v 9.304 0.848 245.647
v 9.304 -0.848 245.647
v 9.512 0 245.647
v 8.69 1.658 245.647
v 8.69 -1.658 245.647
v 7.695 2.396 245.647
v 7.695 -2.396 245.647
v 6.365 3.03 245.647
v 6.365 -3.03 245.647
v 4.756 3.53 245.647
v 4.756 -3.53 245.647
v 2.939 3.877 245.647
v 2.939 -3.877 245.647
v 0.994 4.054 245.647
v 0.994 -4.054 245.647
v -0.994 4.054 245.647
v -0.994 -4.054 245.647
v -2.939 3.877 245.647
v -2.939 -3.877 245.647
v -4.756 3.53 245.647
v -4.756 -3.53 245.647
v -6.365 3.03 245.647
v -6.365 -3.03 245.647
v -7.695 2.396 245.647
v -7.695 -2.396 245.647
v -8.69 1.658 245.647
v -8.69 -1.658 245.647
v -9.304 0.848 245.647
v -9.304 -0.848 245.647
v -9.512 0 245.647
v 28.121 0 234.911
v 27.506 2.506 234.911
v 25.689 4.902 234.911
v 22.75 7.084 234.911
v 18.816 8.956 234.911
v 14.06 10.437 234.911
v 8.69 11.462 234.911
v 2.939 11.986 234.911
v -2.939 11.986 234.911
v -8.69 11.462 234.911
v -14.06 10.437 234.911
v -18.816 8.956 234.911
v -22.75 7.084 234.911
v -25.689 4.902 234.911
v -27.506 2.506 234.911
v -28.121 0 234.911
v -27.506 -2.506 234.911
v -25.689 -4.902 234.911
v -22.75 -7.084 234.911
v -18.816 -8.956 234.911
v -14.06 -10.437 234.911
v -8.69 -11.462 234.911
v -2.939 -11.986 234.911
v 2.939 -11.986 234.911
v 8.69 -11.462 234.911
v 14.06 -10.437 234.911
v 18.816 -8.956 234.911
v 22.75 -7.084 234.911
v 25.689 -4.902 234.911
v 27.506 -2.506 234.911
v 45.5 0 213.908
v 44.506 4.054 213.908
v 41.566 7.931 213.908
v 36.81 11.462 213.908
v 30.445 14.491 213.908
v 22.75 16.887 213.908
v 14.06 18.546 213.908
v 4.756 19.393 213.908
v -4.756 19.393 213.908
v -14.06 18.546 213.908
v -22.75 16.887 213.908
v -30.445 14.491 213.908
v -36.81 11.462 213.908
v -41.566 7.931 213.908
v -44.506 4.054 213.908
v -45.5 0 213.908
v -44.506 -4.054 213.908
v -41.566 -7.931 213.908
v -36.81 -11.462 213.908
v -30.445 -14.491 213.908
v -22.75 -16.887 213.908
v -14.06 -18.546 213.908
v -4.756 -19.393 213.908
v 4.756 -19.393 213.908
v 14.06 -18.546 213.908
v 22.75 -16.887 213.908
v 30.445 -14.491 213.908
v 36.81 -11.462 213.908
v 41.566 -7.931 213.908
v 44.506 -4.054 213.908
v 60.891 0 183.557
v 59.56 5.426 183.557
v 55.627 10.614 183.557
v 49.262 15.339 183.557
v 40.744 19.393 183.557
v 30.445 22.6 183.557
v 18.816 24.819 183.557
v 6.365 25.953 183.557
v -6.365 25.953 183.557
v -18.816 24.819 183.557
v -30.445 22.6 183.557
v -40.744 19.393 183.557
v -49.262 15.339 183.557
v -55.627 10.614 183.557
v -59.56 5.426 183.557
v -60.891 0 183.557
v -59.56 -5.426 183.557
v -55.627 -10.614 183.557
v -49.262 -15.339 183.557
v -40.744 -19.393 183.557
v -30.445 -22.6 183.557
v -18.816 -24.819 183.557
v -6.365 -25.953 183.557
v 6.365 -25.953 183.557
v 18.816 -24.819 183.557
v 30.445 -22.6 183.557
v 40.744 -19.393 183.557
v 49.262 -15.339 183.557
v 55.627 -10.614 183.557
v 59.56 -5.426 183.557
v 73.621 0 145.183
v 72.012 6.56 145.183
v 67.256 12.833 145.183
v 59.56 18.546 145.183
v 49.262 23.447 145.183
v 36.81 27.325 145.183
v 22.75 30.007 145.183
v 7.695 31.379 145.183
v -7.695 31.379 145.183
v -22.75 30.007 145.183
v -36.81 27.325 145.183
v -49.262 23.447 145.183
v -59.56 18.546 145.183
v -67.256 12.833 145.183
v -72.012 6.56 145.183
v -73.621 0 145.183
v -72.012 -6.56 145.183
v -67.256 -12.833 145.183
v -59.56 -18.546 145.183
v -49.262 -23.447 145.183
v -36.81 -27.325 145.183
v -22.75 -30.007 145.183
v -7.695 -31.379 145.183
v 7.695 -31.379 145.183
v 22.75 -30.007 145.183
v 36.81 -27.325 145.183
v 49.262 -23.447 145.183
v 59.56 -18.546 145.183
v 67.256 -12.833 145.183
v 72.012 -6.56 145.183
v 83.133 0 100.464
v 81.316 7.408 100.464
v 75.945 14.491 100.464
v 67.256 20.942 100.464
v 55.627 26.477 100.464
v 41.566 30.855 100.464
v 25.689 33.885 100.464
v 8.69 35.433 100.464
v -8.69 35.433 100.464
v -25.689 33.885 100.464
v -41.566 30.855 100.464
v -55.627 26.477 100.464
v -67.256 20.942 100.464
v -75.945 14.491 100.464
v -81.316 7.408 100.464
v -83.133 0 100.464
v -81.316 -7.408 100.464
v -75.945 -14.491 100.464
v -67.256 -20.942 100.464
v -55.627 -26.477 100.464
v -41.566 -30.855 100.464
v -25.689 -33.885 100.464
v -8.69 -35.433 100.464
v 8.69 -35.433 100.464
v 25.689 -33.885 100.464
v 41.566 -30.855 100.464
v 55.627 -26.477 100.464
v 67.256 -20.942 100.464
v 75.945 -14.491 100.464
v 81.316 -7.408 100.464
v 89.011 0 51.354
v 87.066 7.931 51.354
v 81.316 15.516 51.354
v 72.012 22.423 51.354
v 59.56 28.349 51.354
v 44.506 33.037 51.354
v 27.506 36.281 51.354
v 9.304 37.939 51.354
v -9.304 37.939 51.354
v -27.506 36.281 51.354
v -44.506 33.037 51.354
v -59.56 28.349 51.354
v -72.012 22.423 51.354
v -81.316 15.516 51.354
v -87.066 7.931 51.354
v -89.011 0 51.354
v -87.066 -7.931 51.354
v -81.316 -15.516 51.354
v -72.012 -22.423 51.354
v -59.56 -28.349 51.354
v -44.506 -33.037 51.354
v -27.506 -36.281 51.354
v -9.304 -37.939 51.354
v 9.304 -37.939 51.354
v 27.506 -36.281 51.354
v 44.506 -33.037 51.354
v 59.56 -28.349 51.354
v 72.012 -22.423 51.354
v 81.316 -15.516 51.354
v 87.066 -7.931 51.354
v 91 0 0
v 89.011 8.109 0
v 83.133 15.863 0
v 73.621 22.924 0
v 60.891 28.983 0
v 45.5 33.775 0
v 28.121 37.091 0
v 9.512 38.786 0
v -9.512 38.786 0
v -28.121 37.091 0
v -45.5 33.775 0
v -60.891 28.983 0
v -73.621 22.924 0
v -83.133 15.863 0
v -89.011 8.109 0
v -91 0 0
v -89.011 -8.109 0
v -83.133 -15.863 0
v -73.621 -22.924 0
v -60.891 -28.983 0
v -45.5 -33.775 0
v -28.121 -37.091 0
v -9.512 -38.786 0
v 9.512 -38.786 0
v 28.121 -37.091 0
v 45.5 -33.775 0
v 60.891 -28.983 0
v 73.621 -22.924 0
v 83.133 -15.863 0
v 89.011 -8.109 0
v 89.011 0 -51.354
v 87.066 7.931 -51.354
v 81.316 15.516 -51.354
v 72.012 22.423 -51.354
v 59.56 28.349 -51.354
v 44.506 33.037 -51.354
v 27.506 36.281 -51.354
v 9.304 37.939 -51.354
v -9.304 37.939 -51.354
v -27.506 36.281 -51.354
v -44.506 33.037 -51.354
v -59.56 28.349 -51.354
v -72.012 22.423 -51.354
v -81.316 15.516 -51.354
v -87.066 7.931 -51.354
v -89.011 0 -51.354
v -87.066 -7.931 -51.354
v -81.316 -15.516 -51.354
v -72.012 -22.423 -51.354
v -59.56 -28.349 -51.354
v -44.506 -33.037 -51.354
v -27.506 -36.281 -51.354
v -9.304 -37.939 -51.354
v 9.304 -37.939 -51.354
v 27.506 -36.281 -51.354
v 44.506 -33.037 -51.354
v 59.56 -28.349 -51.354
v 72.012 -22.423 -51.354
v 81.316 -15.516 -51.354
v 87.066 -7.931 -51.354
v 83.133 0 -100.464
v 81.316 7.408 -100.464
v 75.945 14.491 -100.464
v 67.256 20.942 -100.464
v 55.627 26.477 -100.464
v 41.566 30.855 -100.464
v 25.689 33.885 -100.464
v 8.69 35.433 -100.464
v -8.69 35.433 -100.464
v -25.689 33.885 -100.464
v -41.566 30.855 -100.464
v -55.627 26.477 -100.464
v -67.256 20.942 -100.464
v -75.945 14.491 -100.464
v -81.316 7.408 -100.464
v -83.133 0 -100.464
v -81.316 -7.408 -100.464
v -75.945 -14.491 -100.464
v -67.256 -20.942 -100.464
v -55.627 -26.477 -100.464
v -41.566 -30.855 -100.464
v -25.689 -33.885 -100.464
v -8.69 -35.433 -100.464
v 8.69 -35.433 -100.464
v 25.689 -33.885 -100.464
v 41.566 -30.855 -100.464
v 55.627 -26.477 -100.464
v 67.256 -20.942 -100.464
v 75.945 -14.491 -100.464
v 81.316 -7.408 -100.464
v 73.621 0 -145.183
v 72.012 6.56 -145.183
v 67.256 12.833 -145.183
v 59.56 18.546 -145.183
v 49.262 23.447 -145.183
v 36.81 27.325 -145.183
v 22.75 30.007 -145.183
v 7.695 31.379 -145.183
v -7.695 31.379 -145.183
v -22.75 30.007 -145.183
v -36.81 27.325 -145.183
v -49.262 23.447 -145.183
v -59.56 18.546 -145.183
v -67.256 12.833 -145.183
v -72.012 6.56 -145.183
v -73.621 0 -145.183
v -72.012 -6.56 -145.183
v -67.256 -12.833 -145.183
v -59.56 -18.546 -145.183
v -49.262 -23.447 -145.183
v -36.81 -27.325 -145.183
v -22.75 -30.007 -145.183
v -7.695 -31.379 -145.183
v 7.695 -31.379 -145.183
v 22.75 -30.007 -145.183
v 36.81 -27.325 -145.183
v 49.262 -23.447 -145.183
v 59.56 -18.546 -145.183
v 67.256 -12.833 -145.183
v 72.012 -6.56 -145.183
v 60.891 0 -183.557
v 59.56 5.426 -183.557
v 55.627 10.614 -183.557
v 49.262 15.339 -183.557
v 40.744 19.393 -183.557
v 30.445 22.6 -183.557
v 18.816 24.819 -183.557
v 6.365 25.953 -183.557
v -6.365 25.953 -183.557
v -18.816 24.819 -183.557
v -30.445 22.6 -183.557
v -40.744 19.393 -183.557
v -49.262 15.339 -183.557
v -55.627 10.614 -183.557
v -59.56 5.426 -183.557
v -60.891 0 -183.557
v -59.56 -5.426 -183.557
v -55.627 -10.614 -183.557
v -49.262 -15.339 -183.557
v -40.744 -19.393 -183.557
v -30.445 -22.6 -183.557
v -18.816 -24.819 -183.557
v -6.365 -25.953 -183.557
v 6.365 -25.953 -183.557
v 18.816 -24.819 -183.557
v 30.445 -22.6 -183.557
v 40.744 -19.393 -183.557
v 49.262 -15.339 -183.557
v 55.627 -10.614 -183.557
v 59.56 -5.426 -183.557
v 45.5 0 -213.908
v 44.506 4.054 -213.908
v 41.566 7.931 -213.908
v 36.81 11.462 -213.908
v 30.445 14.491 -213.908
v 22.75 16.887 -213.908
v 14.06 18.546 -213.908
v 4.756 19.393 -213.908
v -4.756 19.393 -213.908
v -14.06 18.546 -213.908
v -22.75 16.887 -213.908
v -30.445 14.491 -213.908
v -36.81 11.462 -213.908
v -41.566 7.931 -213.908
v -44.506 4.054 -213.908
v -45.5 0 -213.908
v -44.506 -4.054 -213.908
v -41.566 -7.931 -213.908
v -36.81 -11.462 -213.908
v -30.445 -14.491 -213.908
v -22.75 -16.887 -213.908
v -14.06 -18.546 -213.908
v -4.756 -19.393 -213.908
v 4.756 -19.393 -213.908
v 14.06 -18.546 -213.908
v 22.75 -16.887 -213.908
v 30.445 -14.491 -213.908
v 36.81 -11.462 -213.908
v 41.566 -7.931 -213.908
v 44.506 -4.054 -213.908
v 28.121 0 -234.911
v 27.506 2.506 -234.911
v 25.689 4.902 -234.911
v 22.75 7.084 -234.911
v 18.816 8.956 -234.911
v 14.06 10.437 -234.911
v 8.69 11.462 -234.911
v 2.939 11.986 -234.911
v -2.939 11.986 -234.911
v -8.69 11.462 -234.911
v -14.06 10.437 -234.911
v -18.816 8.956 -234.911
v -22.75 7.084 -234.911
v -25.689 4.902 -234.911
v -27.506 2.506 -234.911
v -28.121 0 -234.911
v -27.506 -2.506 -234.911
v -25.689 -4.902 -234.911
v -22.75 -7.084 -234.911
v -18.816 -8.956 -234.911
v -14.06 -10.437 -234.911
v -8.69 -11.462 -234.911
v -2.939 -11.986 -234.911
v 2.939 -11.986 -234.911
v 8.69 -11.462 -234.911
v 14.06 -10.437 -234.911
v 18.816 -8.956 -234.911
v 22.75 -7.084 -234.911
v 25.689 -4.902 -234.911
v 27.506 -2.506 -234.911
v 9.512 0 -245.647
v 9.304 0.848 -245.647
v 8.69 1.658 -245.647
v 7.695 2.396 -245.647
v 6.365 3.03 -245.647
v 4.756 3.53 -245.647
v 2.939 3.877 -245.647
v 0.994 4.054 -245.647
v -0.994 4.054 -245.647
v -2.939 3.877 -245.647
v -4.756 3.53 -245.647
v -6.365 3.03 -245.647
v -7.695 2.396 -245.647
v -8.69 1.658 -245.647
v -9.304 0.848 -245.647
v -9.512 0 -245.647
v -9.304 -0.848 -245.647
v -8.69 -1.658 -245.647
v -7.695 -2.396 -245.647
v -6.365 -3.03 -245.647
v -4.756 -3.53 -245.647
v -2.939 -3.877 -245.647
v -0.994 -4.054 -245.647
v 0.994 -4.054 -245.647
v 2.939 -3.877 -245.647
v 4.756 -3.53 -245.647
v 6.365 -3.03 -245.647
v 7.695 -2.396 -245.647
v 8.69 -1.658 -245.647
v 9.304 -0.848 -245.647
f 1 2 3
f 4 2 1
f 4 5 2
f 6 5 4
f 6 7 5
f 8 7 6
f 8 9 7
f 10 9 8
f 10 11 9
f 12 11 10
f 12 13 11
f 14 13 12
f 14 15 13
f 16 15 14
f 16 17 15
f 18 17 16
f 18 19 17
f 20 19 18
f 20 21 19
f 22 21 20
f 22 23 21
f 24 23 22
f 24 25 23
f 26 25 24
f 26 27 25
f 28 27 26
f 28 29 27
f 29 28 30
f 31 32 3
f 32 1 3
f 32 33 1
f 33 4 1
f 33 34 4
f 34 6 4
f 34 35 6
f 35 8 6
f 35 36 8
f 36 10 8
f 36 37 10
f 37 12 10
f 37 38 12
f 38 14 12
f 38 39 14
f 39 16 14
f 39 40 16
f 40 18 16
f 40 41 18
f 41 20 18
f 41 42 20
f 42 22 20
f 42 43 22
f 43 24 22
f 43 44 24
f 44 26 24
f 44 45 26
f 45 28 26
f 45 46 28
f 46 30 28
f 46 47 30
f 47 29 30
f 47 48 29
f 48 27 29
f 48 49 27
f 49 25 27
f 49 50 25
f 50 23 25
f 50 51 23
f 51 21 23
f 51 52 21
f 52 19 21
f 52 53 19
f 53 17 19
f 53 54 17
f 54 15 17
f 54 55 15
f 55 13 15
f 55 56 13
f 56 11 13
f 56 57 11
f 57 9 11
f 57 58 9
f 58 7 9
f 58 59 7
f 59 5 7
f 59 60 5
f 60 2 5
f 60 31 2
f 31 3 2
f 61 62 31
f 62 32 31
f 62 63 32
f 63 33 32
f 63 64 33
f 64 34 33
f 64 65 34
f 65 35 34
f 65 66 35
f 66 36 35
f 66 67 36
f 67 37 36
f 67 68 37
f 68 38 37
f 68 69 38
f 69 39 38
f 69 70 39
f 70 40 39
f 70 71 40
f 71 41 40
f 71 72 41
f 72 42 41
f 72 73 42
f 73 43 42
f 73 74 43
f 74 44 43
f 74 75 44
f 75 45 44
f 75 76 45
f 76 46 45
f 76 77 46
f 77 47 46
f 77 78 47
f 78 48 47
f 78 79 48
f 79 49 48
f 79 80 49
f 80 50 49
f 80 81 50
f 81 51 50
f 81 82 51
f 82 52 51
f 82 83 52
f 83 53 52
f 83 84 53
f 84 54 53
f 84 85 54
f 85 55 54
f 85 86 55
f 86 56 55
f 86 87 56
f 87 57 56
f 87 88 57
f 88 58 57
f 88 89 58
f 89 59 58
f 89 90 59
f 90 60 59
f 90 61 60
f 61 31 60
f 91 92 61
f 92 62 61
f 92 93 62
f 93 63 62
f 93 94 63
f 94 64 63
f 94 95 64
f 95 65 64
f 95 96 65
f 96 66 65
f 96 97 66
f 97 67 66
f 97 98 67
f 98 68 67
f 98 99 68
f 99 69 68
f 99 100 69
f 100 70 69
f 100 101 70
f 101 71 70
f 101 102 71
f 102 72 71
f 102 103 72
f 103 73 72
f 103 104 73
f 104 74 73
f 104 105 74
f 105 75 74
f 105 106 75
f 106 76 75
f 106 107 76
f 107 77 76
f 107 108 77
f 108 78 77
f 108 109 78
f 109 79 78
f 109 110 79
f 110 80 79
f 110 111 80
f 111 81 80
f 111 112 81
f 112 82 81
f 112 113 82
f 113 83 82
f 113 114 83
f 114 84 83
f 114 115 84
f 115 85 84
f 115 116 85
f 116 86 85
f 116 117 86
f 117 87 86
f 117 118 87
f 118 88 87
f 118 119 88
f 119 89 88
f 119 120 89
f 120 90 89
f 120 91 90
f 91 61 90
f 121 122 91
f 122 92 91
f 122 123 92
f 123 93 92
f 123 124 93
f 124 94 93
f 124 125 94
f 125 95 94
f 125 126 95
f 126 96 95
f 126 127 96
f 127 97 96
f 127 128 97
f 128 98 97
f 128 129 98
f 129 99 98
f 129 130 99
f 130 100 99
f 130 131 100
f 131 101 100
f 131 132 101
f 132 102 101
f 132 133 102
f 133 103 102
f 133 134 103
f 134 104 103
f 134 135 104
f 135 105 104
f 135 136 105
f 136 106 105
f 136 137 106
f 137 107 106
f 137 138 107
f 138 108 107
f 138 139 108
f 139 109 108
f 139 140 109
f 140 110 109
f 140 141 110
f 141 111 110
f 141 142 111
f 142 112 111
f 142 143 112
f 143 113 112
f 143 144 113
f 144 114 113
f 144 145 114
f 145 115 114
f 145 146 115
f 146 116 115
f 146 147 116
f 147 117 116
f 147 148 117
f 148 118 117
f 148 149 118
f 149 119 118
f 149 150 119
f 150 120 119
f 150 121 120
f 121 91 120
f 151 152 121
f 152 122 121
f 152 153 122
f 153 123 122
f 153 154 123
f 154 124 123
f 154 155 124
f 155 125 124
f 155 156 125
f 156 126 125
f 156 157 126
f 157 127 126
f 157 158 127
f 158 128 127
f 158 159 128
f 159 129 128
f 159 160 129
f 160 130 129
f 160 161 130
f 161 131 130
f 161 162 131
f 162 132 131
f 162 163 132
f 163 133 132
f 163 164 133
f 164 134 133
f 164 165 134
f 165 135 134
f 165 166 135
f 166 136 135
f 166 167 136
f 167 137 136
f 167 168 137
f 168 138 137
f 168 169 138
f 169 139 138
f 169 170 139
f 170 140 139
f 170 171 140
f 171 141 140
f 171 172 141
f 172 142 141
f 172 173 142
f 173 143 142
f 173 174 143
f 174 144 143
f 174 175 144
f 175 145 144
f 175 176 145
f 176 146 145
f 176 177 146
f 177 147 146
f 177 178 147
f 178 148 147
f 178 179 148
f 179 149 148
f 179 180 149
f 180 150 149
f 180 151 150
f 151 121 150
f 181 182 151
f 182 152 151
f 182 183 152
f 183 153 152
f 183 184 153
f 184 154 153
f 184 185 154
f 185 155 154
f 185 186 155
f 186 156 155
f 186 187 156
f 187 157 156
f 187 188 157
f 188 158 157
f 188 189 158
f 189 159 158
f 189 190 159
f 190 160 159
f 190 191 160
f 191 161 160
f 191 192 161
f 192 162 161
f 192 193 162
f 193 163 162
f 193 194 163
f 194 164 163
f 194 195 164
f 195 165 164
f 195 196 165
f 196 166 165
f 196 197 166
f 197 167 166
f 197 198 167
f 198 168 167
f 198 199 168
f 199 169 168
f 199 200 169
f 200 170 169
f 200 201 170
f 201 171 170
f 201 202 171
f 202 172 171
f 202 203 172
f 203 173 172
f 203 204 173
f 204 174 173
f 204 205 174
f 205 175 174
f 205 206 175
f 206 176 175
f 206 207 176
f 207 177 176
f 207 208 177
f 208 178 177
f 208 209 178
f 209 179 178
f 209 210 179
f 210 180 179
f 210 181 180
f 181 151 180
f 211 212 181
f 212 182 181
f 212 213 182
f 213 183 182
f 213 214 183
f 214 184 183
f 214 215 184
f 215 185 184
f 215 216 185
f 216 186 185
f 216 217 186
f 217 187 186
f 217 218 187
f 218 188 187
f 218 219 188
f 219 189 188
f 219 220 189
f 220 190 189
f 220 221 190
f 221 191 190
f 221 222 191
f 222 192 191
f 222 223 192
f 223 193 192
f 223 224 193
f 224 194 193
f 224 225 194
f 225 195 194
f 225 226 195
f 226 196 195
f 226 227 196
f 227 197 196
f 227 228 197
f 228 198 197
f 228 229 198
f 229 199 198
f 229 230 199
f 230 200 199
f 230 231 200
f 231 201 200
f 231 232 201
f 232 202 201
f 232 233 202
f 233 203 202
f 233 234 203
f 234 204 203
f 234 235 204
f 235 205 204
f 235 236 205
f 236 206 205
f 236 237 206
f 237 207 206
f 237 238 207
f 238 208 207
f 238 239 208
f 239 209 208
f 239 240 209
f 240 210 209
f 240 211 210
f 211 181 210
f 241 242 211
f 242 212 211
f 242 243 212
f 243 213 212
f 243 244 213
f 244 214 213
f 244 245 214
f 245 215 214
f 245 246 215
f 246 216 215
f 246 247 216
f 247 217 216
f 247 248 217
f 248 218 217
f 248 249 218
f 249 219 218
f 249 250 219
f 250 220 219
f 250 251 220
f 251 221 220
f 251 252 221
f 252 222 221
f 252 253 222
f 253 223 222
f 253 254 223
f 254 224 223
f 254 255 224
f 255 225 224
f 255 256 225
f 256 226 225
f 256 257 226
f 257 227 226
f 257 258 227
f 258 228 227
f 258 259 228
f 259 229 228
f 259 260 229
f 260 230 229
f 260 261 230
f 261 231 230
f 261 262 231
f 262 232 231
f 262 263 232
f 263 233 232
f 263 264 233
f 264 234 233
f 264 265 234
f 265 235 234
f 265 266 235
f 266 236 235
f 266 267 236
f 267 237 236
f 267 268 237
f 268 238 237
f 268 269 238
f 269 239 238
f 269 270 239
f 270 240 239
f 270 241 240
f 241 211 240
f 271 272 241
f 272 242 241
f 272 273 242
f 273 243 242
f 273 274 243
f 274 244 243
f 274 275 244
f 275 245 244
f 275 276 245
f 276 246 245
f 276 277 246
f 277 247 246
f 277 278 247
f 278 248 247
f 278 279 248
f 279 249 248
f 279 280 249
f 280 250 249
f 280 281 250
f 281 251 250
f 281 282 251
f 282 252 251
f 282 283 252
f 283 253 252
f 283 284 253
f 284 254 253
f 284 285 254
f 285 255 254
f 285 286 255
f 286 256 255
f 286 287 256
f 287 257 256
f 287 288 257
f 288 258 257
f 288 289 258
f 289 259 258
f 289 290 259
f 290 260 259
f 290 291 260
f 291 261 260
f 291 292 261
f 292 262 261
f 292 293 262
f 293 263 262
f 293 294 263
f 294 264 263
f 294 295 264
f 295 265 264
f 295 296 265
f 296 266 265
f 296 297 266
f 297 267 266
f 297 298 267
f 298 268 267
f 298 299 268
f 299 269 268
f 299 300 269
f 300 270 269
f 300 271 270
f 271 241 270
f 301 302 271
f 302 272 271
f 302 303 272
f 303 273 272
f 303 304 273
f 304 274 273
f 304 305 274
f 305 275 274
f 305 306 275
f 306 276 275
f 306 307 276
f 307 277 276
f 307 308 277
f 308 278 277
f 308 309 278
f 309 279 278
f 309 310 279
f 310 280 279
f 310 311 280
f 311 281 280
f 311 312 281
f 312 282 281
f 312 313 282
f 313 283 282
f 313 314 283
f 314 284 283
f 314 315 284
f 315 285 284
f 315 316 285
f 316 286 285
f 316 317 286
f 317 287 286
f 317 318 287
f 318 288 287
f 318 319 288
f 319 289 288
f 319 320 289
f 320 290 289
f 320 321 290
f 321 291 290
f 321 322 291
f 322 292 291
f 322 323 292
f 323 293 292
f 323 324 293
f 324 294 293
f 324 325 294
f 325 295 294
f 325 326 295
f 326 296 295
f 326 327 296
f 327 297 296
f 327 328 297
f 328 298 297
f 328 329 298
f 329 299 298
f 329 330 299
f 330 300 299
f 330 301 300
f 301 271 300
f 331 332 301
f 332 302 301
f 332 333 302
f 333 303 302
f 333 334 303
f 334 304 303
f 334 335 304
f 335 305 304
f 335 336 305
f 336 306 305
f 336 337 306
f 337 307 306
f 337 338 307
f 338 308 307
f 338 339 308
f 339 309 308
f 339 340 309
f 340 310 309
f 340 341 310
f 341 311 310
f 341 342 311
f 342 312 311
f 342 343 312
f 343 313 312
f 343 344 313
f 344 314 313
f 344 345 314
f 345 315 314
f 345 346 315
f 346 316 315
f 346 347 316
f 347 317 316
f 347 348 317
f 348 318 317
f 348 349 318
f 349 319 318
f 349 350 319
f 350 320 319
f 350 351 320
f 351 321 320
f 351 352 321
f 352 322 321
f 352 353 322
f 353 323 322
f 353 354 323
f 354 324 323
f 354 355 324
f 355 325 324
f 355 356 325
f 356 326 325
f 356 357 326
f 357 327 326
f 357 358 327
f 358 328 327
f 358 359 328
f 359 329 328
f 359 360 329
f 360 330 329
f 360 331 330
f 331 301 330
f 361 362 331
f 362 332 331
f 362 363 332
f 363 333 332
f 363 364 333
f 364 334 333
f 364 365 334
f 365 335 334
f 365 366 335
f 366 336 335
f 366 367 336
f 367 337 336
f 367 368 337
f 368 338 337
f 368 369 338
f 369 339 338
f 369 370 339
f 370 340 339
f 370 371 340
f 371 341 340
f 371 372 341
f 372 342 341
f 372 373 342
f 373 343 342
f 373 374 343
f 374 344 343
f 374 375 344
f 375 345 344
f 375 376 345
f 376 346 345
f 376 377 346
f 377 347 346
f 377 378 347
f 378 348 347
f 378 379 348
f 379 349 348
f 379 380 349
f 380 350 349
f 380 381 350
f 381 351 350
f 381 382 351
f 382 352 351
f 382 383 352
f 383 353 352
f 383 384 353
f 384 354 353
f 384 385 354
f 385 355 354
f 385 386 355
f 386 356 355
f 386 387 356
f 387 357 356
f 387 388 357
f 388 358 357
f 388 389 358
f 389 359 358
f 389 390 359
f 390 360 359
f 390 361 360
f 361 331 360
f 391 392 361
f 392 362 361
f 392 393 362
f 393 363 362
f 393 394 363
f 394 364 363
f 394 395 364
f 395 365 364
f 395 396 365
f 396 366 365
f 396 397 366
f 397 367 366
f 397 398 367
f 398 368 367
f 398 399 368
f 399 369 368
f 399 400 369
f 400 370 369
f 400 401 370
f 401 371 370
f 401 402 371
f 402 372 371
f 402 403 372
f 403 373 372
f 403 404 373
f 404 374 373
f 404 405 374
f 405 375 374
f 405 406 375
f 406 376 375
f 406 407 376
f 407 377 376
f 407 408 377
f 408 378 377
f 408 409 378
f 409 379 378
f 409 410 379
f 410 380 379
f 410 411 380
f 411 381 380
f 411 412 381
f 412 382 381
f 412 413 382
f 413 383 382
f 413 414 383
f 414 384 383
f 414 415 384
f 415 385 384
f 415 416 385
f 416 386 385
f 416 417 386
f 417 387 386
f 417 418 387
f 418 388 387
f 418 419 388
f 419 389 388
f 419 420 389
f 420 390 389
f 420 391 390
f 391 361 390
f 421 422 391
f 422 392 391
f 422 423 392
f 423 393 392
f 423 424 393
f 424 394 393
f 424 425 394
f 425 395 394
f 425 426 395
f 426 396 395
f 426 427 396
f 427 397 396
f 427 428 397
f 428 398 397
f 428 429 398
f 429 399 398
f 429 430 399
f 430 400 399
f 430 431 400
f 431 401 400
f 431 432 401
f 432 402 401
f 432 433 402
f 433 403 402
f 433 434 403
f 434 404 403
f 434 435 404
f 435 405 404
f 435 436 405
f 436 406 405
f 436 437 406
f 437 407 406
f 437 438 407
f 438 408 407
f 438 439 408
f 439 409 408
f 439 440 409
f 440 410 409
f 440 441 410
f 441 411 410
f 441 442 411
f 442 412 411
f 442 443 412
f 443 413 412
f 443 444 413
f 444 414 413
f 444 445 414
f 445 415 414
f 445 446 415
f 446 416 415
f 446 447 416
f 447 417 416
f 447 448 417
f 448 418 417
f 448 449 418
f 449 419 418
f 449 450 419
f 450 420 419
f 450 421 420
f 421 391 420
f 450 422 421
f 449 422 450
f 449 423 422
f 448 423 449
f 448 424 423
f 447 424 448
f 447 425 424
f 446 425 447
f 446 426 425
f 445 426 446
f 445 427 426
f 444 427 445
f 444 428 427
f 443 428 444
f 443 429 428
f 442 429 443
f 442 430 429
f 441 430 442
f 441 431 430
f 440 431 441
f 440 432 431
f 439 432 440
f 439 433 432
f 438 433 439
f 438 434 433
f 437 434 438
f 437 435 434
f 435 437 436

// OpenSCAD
// Generated by SolidPython 1.0.1 on 2020-07-29 00:46:47


scale(v = [7, 3, 19]) {
	sphere(r = 13);
}
/***********************************************
*********      SolidPython code:      **********
************************************************
 
# import packages: SolidPython
from solid import *
from solid.utils import *
from itertools import chain, combinations, permutations


class Resize:

    def __init__(self, scad_file):
        self.scad_file = scad_file
        #self.scad_file = import_scad(scad_file)
        # cone/cylinder param:
        self.r1 = 0
        self.r2 = 0
        self.h = 0
        # rectangular prism param:
        self.w = 0
        self.l = 0
        # ellipse param:
        self.r = 0

    # import OpenScad code (file name corresponds to shape)


    # classify shape + parameters
    def assign(self, param1, param2, param3):
        if self.scad_file == 'cone.scad':
            self.r1 = param1
            self.r2 = param2
            self.h = param3
        elif self.scad_file == 'cylinder.scad':
            self.r1 = param1
            self.r2 = param2
            self.h = param3
        elif self.scad_file == 'rectangularPrism.scad':
            self.h = param1
            self.l = param2
            self.w = param3
        else:
            self.r = param1
            self.h = param2

    # resize parameters
    def iterate(self):
        x = range(3, 20, 2)
        i = 1
        if self.scad_file == 'cone.scad':
            tempList = list(permutations(x, 2))
            for temp in tempList:
                param1 = temp[0]
                param2 = temp[1]
                filepath = 'produced_scad_files/' + 'cone' + str(param1) + '_' + str(param2) + '_' + '.scad'
                scad_render_to_file(cylinder(h=param1, r1=param2, r2=0), filepath)

        elif self.scad_file == 'cylinder.scad':
            tempList = list(permutations(x, 3))
            for temp in tempList:
                param1 = temp[0]
                param2 = temp[1]
                filepath = 'produced_scad_files/' + 'cylinder' + str(param1) + '_' + str(param2) + '_' + '.scad'
                scad_render_to_file(cylinder(h=param1, r1=param2, r2=param2), filepath)

        elif self.scad_file == 'rectangularPrism.scad':
            tempList = list(permutations(x, 3))
            for temp in tempList:
                param1 = temp[0]
                param2 = temp[1]
                param3 = temp[2]
                filepath = 'produced_scad_files/' + 'rectangularPrism' + str(param1) + '_' + str(param2) + '_' + str(
                    param3) + '.scad'
                scad_render_to_file(cube(size=(param1, param2, param3)), filepath)

        elif self.scad_file == 'ellipse.scad':
            tempList = list(permutations(x, 4))
            for temp in tempList:
                param1 = temp[0]
                param2 = temp[1]
                param3 = temp[2]
                param4 = temp[3]
                filepath = 'produced_scad_files/' + 'ellipse' + str(param1) + '_' + str(param2) + '_' + str(param3) + '_' + str(param4) + '.scad'
                scad_render_to_file(scale([param1, param2, param3])(sphere(r=param4)), filepath)

    def render_to_scadfile(self):
        scad_render_to_file(scad, 'example.scad') 
 
************************************************/
